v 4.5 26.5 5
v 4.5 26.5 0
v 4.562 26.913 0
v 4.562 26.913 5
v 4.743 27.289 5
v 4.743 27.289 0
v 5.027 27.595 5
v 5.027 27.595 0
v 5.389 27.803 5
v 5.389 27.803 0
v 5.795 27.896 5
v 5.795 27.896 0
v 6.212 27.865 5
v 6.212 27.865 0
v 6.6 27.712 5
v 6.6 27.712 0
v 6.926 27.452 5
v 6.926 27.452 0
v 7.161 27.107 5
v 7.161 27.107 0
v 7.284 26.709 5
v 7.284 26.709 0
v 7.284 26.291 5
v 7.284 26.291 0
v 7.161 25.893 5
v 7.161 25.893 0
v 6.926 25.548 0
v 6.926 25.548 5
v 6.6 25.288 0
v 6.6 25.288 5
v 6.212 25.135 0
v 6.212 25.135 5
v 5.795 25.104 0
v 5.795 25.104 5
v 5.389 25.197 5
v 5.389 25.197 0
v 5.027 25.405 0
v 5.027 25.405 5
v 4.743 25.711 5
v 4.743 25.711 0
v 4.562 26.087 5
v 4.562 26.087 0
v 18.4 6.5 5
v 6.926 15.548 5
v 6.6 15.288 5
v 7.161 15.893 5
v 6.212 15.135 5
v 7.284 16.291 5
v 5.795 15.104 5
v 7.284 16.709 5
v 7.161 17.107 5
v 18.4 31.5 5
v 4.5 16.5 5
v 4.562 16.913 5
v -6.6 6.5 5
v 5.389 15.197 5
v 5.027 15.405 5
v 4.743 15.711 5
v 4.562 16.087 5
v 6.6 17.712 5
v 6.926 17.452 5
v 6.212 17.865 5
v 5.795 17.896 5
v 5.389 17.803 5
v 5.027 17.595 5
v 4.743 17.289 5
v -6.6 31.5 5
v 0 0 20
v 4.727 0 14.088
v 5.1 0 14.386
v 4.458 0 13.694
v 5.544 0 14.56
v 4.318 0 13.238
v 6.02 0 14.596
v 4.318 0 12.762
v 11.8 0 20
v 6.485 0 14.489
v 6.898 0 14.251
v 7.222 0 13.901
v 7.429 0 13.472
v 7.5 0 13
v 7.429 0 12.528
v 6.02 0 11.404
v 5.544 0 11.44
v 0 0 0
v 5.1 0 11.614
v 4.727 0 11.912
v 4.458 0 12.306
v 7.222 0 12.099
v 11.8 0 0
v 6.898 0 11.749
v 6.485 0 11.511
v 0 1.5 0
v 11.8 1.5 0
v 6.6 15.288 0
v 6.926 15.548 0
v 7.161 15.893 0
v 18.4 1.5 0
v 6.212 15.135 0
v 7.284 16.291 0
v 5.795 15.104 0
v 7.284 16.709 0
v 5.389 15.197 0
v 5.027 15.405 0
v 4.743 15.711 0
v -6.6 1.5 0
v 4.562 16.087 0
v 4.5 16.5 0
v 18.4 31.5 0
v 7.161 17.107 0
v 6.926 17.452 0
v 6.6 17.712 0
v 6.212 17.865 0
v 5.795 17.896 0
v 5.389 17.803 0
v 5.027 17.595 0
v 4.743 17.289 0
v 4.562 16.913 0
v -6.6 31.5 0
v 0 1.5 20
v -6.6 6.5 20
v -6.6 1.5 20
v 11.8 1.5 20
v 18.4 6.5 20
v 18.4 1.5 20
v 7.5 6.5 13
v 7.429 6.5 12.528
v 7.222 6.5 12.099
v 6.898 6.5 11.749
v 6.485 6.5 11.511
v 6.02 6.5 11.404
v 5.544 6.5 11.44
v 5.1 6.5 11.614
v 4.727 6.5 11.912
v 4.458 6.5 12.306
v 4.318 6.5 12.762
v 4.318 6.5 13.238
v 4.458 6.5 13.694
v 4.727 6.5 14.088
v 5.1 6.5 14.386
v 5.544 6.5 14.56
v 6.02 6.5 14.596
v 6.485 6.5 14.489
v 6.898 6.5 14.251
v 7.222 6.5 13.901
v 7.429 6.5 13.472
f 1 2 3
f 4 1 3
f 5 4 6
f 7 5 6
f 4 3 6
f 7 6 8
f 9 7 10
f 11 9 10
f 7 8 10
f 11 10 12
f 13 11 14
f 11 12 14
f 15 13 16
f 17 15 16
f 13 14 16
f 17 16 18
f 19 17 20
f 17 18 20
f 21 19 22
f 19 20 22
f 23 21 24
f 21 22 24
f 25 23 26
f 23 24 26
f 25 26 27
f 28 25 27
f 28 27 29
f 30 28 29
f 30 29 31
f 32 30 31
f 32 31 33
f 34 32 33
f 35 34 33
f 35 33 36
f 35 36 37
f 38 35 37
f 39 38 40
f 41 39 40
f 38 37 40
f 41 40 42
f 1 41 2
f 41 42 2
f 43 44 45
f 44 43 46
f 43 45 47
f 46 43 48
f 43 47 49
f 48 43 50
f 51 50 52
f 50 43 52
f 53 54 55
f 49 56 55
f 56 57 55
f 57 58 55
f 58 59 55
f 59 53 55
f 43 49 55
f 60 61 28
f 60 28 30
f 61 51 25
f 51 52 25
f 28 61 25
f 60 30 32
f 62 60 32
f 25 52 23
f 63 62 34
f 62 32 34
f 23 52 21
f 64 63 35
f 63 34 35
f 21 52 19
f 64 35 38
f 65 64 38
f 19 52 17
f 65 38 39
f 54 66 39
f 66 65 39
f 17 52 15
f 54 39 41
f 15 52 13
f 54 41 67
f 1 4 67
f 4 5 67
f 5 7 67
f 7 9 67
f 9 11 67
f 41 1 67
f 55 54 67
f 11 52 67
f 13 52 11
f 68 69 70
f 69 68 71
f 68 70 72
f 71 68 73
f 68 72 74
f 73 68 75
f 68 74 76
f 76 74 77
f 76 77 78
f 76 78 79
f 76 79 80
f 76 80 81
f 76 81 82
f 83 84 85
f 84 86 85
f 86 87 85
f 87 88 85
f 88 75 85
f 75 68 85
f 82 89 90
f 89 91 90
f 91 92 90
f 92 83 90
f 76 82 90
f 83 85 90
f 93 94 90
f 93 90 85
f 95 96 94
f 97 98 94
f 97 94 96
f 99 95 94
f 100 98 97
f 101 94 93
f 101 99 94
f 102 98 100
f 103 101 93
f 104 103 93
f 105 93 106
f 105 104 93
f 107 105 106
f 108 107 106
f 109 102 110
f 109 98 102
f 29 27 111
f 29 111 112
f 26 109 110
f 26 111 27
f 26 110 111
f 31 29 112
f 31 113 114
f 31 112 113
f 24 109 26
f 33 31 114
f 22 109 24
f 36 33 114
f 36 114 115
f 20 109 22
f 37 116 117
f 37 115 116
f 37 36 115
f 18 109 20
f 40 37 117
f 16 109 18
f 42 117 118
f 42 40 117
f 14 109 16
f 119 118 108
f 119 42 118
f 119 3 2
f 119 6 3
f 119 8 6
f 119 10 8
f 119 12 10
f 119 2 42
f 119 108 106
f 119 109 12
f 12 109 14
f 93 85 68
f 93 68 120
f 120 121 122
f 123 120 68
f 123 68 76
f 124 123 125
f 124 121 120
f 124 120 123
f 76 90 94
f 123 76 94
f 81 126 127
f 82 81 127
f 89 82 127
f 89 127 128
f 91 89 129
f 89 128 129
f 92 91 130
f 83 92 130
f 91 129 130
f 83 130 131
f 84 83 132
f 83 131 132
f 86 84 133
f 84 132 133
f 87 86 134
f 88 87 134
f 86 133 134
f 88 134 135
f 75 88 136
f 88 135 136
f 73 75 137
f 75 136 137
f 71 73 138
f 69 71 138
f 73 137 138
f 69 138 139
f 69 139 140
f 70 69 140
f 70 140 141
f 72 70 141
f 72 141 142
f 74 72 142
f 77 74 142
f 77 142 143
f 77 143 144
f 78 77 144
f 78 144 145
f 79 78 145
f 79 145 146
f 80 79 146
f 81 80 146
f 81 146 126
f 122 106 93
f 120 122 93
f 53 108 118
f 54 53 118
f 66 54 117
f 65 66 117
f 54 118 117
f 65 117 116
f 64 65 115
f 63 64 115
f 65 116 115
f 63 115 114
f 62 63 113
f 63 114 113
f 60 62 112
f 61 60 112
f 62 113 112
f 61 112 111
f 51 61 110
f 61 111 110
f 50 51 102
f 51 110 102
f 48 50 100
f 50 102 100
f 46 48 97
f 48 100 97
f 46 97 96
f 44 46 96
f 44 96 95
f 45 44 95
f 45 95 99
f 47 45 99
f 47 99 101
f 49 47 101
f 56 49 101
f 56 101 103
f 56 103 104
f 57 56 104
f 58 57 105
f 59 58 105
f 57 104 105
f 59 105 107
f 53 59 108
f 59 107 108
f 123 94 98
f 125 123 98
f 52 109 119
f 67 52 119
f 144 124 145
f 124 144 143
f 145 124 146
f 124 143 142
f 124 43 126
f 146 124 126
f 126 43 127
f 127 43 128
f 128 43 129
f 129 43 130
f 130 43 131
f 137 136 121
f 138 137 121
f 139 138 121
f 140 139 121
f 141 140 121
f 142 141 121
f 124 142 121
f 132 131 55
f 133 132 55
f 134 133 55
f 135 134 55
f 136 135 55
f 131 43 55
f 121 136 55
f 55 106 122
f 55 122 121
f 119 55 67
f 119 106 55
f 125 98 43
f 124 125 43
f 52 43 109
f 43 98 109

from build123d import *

# Parameters (mm, degrees)
SKETCH1_W           = 11.8
SKETCH1_H           = 1.5
BOSS_EXTRUDE1_DEPTH = 20
SKETCH3_W           = 25
SKETCH3_H           = 25
SKETCH3_R           = 1.4
BOSS_EXTRUDE2_DEPTH = 5
SKETCH4_R           = 1.6
CUT_EXTRUDE2_DEPTH  = 7.5


with BuildPart() as part:
    # Sketch1 → Boss-Extrude1 (new body)
    with BuildSketch(Plane.XY):
        Polygon((-6.6, 1.5), (0, 1.5), (11.8, 1.5), (18.4, 1.5), (18.4, 6.5), (-6.6, 6.5), align=None)
        with Locations((5.9, 0.75)):
            Rectangle(SKETCH1_W, SKETCH1_H)
    extrude(amount=BOSS_EXTRUDE1_DEPTH)

    # Sketch3 → Boss-Extrude2 (add)
    with BuildSketch(Plane(origin=(0, 0, 0), x_dir=(-1, 0, 0), z_dir=(0, 0, -1))):
        with Locations((-5.9, 19)):
            Rectangle(SKETCH3_W, SKETCH3_H)
        with Locations((-5.9, 16.5)):
            Circle(SKETCH3_R, mode=Mode.SUBTRACT)
        with Locations((-5.9, 26.5)):
            Circle(SKETCH3_R, mode=Mode.SUBTRACT)
    extrude(amount=-BOSS_EXTRUDE2_DEPTH)

    # Sketch4 → Cut-Extrude2 (cut, through all)
    with BuildSketch(Plane(origin=(0, 6.5, 0), x_dir=(1, 0, 0), z_dir=(0, 1, 0))):
        with Locations((5.9, -13)):
            Circle(SKETCH4_R)
    extrude(amount=-CUT_EXTRUDE2_DEPTH, mode=Mode.SUBTRACT)


solid = part.part
